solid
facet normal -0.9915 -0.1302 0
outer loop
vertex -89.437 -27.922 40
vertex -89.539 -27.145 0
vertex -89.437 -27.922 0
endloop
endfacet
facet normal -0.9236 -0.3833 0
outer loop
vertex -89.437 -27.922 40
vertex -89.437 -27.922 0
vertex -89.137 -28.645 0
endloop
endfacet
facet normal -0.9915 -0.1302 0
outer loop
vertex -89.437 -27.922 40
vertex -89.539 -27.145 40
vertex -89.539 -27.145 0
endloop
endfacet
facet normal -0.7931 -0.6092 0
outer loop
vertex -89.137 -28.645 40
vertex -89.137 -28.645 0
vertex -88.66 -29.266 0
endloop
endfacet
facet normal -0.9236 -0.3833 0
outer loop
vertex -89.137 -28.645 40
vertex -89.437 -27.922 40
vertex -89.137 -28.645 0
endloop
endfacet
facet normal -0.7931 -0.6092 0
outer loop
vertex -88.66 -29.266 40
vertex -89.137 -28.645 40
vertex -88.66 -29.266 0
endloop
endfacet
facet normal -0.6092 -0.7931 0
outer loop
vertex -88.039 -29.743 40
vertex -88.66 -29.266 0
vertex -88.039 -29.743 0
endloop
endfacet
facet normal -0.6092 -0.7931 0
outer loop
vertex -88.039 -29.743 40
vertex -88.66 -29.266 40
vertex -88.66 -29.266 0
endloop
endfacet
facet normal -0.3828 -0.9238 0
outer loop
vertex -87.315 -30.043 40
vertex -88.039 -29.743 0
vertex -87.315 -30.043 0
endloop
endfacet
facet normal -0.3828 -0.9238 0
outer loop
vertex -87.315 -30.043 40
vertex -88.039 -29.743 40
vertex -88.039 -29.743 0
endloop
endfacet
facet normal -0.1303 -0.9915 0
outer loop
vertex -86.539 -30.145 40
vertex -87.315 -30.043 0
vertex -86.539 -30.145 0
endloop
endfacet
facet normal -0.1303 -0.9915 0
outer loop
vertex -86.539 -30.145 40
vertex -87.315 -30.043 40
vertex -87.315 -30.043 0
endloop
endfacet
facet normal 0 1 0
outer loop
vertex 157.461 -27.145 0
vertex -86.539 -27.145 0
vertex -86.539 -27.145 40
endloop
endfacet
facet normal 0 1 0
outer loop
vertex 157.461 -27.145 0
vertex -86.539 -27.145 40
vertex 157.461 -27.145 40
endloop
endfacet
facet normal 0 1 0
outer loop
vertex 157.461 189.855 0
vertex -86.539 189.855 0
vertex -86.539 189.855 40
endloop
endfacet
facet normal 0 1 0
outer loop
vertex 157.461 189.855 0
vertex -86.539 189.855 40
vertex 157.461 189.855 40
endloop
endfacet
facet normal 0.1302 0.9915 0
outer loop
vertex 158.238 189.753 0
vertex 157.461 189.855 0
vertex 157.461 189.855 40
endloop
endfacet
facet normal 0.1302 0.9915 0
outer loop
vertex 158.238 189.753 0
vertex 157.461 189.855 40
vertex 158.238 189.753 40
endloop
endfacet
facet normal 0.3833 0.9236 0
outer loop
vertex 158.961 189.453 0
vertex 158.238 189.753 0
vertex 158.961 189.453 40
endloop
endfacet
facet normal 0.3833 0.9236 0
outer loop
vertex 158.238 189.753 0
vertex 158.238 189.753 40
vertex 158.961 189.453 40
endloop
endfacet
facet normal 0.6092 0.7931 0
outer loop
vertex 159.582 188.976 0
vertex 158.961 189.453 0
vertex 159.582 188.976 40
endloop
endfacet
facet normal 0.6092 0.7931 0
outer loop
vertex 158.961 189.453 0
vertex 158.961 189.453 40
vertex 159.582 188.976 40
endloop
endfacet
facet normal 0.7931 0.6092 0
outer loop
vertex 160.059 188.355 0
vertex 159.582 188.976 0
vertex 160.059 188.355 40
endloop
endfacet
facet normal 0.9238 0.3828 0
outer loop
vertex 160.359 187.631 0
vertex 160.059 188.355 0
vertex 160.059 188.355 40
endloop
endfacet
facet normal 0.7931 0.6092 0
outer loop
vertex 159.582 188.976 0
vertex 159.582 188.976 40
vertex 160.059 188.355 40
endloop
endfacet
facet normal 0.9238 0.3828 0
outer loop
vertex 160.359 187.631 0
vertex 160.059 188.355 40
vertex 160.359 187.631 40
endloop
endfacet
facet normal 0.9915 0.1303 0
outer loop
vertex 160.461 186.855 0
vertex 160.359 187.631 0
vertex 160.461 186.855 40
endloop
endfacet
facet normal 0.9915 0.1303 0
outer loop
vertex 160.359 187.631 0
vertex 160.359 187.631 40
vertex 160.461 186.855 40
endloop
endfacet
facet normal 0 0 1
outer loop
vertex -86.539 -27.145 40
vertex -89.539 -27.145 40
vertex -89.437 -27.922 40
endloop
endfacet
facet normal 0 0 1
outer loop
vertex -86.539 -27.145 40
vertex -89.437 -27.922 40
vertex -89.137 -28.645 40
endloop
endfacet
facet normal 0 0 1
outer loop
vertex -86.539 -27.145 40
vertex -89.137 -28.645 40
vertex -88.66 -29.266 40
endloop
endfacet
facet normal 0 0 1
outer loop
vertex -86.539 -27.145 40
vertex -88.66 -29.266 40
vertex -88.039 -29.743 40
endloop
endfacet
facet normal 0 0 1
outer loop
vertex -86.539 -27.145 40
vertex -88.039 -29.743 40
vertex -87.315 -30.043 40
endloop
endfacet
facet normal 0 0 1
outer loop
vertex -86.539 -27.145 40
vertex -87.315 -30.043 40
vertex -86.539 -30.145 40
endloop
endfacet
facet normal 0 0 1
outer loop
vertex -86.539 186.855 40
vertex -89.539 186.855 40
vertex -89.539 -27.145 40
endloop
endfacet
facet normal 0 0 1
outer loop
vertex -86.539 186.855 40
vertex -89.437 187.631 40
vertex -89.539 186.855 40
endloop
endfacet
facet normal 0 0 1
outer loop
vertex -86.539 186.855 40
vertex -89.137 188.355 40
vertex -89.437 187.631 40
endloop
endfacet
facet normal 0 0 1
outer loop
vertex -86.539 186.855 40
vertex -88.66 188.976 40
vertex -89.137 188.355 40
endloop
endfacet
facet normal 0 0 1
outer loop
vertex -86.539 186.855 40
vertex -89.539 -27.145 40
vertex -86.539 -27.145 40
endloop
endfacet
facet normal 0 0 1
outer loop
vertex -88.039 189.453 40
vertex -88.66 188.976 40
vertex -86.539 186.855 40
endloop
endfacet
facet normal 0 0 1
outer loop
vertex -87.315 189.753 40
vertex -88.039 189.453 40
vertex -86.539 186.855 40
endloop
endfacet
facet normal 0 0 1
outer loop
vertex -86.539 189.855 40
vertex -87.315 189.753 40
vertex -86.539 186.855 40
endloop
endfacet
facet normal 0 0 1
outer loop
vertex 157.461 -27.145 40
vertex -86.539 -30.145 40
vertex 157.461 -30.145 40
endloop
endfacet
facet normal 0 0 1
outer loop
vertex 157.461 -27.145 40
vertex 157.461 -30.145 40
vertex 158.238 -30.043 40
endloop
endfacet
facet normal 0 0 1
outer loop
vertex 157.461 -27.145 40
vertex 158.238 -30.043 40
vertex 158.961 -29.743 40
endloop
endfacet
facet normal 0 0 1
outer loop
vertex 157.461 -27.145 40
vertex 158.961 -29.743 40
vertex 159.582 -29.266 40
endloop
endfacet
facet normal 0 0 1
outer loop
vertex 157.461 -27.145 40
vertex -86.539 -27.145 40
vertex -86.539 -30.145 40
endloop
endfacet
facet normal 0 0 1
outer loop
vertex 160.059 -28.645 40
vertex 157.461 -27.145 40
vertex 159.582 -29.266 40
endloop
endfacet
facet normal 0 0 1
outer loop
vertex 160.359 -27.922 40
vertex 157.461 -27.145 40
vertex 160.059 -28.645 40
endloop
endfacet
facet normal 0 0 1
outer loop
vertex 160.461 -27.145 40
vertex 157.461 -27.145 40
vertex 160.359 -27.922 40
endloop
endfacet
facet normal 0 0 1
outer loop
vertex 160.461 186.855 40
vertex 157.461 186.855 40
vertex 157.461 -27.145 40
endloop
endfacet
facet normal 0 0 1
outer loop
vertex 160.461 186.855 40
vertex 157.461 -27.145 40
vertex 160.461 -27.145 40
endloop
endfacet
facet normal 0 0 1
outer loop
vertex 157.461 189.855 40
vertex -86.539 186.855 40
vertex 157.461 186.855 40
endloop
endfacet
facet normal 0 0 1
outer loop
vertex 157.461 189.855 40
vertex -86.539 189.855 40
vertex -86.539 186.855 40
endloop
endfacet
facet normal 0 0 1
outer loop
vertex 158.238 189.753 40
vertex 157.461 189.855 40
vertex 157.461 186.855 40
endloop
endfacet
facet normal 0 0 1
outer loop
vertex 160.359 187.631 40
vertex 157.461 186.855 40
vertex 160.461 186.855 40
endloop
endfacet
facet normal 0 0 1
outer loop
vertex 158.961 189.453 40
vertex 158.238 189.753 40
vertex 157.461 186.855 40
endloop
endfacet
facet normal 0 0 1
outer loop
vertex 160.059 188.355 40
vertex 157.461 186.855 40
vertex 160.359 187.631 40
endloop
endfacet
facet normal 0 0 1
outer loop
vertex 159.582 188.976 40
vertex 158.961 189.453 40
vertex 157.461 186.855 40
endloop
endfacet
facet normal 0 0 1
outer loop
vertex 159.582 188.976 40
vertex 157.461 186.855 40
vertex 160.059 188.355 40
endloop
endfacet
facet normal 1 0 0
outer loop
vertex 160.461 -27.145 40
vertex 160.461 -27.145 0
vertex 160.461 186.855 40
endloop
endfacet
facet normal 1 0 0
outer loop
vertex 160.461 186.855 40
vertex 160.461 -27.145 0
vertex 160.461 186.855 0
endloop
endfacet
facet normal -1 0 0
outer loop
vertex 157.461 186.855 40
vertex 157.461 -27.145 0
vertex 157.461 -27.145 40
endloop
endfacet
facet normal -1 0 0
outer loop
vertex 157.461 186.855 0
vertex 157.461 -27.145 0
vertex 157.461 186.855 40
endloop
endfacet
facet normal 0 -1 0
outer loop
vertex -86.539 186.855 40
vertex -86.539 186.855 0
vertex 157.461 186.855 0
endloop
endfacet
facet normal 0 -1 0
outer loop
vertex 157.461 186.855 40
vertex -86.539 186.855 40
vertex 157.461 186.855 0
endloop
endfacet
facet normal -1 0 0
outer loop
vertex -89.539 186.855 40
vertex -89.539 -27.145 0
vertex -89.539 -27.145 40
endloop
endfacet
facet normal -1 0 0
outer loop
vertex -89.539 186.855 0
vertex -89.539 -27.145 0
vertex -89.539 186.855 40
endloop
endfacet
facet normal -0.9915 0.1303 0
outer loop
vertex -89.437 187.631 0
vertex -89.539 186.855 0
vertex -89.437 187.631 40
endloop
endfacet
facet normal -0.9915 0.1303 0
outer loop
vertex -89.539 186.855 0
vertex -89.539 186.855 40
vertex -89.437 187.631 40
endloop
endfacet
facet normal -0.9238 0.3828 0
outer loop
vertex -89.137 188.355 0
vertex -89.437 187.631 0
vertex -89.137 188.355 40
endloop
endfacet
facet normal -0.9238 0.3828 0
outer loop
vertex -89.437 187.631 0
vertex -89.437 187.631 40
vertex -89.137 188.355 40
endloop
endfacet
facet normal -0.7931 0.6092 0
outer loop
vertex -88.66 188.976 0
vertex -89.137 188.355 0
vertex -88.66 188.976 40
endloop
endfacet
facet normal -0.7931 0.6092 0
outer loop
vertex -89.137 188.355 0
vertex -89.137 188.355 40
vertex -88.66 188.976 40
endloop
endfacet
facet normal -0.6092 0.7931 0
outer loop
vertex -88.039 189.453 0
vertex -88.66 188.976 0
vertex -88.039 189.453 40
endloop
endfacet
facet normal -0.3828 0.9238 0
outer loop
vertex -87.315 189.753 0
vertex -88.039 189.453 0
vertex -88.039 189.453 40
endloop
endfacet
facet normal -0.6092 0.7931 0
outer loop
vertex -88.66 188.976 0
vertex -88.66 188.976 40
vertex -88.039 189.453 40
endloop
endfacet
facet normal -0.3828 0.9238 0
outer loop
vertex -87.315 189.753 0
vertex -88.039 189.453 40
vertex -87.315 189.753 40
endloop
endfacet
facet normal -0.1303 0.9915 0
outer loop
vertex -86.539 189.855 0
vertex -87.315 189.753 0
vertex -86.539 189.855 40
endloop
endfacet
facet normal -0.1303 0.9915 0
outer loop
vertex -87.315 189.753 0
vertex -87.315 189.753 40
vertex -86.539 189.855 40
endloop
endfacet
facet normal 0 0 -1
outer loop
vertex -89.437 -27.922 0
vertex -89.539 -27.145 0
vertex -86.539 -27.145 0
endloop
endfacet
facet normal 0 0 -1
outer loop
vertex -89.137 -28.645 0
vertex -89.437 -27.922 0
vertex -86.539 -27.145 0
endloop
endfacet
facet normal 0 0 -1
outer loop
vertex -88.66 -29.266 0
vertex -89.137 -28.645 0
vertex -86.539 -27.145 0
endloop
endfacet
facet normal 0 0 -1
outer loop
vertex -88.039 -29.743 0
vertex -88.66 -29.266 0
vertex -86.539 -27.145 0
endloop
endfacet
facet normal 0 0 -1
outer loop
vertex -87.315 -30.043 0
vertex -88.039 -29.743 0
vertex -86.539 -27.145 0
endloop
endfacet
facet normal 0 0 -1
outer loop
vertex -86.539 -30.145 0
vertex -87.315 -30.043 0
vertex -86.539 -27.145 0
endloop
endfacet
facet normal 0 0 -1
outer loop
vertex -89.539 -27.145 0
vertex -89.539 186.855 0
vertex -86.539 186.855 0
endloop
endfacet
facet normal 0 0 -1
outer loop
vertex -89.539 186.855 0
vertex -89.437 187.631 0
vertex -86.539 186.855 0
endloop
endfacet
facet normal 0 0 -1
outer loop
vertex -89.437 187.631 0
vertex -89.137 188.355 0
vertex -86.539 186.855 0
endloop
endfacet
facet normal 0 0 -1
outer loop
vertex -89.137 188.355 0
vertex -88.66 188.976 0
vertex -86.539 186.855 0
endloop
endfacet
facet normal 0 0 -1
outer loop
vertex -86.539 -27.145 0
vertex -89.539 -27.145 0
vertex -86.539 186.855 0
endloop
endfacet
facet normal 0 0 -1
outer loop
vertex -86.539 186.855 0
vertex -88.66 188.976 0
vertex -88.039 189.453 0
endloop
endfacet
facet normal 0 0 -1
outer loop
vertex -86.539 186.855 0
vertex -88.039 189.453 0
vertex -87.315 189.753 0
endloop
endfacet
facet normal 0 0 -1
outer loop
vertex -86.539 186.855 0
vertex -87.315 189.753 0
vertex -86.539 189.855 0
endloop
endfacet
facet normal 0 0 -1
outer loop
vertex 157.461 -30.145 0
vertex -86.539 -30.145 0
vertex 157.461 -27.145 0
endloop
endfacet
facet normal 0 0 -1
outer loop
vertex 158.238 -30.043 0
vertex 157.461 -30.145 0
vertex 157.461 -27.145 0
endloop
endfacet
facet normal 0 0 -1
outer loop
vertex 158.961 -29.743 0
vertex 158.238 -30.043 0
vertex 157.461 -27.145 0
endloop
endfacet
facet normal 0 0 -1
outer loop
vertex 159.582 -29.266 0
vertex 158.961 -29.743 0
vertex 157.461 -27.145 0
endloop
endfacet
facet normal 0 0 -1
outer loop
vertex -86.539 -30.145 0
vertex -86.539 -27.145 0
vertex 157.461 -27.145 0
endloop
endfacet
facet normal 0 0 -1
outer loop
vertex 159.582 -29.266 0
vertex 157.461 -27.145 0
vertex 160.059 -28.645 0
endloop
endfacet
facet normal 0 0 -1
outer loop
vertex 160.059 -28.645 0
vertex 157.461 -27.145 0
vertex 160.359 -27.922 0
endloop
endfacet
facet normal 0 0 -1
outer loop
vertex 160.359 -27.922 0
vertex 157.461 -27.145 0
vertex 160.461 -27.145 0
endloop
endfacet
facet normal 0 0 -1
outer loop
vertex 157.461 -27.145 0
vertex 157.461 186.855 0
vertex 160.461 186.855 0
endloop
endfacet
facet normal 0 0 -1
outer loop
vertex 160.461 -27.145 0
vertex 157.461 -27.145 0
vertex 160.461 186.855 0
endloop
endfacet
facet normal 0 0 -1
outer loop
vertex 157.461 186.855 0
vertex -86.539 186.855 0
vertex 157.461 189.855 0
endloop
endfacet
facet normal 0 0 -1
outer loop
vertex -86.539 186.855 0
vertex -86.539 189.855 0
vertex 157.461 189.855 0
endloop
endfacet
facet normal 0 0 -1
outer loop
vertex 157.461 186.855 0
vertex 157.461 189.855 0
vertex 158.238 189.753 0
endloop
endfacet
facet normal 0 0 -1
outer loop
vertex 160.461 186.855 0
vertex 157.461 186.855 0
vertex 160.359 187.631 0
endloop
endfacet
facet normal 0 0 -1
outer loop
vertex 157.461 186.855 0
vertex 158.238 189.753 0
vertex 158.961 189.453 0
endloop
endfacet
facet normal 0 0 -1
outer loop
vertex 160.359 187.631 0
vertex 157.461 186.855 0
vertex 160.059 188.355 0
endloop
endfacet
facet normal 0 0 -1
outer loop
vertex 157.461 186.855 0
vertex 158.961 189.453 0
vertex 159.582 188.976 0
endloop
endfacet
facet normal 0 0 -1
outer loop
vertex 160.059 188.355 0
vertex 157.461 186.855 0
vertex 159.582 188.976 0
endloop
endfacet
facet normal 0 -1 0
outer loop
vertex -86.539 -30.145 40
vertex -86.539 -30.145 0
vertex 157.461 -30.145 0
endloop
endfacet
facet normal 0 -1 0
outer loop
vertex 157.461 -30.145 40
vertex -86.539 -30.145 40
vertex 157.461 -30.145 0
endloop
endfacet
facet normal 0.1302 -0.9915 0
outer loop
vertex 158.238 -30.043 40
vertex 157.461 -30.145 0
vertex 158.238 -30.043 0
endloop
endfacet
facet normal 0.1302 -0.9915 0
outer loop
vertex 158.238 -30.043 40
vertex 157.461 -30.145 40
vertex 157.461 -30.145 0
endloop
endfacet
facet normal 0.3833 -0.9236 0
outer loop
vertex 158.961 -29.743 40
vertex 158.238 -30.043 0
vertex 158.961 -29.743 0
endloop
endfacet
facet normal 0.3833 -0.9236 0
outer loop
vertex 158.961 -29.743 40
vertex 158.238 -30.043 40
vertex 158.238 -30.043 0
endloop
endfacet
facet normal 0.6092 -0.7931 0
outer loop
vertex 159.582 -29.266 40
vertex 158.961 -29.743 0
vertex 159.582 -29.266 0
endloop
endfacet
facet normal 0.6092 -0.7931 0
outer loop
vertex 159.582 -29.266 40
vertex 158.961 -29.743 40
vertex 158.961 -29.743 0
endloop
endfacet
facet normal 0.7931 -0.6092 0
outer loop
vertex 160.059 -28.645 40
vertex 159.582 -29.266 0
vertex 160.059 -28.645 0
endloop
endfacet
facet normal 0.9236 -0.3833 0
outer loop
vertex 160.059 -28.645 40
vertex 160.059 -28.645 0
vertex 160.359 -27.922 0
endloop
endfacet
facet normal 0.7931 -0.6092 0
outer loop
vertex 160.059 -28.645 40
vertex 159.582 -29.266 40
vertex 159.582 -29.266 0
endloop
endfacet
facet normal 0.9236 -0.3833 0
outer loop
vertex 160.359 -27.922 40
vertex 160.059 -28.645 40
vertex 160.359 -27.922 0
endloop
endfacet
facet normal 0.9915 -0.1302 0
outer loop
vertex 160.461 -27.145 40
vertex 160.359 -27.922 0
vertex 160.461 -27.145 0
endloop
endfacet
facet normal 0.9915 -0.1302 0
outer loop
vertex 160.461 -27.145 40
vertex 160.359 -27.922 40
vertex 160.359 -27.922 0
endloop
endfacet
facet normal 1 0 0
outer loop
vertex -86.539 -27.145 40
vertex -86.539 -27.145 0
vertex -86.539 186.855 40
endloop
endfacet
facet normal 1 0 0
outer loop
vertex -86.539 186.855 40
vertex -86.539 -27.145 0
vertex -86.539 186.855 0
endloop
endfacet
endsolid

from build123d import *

# Parameters (mm, degrees)
SKETCH1_W           = 250
SKETCH1_H           = 220
SKETCH1_W_2         = 244
SKETCH1_H_2         = 214
EXTRUDE_THIN1_DEPTH = 40
FILLET1_R           = 3


with BuildPart() as part:
    # Sketch1 → Extrude-Thin1 (new body)
    with BuildSketch(Plane.XY):
        with Locations((35.461157826, 79.854863969)):
            Rectangle(SKETCH1_W, SKETCH1_H)
        with Locations((35.461157826, 79.854863969)):
            Rectangle(SKETCH1_W_2, SKETCH1_H_2, mode=Mode.SUBTRACT)
    extrude(amount=EXTRUDE_THIN1_DEPTH)

    # Fillet1
    fillet1_edges = [part.edges().sort_by_distance(p)[0] for p in [
        (160.461157826, -30.145136031, 20),
        (-89.538842174, -30.145136031, 20),
        (-89.538842174, 189.854863969, 20),
        (160.461157826, 189.854863969, 20),
    ]]
    fillet(fillet1_edges, radius=FILLET1_R)


solid = part.part
